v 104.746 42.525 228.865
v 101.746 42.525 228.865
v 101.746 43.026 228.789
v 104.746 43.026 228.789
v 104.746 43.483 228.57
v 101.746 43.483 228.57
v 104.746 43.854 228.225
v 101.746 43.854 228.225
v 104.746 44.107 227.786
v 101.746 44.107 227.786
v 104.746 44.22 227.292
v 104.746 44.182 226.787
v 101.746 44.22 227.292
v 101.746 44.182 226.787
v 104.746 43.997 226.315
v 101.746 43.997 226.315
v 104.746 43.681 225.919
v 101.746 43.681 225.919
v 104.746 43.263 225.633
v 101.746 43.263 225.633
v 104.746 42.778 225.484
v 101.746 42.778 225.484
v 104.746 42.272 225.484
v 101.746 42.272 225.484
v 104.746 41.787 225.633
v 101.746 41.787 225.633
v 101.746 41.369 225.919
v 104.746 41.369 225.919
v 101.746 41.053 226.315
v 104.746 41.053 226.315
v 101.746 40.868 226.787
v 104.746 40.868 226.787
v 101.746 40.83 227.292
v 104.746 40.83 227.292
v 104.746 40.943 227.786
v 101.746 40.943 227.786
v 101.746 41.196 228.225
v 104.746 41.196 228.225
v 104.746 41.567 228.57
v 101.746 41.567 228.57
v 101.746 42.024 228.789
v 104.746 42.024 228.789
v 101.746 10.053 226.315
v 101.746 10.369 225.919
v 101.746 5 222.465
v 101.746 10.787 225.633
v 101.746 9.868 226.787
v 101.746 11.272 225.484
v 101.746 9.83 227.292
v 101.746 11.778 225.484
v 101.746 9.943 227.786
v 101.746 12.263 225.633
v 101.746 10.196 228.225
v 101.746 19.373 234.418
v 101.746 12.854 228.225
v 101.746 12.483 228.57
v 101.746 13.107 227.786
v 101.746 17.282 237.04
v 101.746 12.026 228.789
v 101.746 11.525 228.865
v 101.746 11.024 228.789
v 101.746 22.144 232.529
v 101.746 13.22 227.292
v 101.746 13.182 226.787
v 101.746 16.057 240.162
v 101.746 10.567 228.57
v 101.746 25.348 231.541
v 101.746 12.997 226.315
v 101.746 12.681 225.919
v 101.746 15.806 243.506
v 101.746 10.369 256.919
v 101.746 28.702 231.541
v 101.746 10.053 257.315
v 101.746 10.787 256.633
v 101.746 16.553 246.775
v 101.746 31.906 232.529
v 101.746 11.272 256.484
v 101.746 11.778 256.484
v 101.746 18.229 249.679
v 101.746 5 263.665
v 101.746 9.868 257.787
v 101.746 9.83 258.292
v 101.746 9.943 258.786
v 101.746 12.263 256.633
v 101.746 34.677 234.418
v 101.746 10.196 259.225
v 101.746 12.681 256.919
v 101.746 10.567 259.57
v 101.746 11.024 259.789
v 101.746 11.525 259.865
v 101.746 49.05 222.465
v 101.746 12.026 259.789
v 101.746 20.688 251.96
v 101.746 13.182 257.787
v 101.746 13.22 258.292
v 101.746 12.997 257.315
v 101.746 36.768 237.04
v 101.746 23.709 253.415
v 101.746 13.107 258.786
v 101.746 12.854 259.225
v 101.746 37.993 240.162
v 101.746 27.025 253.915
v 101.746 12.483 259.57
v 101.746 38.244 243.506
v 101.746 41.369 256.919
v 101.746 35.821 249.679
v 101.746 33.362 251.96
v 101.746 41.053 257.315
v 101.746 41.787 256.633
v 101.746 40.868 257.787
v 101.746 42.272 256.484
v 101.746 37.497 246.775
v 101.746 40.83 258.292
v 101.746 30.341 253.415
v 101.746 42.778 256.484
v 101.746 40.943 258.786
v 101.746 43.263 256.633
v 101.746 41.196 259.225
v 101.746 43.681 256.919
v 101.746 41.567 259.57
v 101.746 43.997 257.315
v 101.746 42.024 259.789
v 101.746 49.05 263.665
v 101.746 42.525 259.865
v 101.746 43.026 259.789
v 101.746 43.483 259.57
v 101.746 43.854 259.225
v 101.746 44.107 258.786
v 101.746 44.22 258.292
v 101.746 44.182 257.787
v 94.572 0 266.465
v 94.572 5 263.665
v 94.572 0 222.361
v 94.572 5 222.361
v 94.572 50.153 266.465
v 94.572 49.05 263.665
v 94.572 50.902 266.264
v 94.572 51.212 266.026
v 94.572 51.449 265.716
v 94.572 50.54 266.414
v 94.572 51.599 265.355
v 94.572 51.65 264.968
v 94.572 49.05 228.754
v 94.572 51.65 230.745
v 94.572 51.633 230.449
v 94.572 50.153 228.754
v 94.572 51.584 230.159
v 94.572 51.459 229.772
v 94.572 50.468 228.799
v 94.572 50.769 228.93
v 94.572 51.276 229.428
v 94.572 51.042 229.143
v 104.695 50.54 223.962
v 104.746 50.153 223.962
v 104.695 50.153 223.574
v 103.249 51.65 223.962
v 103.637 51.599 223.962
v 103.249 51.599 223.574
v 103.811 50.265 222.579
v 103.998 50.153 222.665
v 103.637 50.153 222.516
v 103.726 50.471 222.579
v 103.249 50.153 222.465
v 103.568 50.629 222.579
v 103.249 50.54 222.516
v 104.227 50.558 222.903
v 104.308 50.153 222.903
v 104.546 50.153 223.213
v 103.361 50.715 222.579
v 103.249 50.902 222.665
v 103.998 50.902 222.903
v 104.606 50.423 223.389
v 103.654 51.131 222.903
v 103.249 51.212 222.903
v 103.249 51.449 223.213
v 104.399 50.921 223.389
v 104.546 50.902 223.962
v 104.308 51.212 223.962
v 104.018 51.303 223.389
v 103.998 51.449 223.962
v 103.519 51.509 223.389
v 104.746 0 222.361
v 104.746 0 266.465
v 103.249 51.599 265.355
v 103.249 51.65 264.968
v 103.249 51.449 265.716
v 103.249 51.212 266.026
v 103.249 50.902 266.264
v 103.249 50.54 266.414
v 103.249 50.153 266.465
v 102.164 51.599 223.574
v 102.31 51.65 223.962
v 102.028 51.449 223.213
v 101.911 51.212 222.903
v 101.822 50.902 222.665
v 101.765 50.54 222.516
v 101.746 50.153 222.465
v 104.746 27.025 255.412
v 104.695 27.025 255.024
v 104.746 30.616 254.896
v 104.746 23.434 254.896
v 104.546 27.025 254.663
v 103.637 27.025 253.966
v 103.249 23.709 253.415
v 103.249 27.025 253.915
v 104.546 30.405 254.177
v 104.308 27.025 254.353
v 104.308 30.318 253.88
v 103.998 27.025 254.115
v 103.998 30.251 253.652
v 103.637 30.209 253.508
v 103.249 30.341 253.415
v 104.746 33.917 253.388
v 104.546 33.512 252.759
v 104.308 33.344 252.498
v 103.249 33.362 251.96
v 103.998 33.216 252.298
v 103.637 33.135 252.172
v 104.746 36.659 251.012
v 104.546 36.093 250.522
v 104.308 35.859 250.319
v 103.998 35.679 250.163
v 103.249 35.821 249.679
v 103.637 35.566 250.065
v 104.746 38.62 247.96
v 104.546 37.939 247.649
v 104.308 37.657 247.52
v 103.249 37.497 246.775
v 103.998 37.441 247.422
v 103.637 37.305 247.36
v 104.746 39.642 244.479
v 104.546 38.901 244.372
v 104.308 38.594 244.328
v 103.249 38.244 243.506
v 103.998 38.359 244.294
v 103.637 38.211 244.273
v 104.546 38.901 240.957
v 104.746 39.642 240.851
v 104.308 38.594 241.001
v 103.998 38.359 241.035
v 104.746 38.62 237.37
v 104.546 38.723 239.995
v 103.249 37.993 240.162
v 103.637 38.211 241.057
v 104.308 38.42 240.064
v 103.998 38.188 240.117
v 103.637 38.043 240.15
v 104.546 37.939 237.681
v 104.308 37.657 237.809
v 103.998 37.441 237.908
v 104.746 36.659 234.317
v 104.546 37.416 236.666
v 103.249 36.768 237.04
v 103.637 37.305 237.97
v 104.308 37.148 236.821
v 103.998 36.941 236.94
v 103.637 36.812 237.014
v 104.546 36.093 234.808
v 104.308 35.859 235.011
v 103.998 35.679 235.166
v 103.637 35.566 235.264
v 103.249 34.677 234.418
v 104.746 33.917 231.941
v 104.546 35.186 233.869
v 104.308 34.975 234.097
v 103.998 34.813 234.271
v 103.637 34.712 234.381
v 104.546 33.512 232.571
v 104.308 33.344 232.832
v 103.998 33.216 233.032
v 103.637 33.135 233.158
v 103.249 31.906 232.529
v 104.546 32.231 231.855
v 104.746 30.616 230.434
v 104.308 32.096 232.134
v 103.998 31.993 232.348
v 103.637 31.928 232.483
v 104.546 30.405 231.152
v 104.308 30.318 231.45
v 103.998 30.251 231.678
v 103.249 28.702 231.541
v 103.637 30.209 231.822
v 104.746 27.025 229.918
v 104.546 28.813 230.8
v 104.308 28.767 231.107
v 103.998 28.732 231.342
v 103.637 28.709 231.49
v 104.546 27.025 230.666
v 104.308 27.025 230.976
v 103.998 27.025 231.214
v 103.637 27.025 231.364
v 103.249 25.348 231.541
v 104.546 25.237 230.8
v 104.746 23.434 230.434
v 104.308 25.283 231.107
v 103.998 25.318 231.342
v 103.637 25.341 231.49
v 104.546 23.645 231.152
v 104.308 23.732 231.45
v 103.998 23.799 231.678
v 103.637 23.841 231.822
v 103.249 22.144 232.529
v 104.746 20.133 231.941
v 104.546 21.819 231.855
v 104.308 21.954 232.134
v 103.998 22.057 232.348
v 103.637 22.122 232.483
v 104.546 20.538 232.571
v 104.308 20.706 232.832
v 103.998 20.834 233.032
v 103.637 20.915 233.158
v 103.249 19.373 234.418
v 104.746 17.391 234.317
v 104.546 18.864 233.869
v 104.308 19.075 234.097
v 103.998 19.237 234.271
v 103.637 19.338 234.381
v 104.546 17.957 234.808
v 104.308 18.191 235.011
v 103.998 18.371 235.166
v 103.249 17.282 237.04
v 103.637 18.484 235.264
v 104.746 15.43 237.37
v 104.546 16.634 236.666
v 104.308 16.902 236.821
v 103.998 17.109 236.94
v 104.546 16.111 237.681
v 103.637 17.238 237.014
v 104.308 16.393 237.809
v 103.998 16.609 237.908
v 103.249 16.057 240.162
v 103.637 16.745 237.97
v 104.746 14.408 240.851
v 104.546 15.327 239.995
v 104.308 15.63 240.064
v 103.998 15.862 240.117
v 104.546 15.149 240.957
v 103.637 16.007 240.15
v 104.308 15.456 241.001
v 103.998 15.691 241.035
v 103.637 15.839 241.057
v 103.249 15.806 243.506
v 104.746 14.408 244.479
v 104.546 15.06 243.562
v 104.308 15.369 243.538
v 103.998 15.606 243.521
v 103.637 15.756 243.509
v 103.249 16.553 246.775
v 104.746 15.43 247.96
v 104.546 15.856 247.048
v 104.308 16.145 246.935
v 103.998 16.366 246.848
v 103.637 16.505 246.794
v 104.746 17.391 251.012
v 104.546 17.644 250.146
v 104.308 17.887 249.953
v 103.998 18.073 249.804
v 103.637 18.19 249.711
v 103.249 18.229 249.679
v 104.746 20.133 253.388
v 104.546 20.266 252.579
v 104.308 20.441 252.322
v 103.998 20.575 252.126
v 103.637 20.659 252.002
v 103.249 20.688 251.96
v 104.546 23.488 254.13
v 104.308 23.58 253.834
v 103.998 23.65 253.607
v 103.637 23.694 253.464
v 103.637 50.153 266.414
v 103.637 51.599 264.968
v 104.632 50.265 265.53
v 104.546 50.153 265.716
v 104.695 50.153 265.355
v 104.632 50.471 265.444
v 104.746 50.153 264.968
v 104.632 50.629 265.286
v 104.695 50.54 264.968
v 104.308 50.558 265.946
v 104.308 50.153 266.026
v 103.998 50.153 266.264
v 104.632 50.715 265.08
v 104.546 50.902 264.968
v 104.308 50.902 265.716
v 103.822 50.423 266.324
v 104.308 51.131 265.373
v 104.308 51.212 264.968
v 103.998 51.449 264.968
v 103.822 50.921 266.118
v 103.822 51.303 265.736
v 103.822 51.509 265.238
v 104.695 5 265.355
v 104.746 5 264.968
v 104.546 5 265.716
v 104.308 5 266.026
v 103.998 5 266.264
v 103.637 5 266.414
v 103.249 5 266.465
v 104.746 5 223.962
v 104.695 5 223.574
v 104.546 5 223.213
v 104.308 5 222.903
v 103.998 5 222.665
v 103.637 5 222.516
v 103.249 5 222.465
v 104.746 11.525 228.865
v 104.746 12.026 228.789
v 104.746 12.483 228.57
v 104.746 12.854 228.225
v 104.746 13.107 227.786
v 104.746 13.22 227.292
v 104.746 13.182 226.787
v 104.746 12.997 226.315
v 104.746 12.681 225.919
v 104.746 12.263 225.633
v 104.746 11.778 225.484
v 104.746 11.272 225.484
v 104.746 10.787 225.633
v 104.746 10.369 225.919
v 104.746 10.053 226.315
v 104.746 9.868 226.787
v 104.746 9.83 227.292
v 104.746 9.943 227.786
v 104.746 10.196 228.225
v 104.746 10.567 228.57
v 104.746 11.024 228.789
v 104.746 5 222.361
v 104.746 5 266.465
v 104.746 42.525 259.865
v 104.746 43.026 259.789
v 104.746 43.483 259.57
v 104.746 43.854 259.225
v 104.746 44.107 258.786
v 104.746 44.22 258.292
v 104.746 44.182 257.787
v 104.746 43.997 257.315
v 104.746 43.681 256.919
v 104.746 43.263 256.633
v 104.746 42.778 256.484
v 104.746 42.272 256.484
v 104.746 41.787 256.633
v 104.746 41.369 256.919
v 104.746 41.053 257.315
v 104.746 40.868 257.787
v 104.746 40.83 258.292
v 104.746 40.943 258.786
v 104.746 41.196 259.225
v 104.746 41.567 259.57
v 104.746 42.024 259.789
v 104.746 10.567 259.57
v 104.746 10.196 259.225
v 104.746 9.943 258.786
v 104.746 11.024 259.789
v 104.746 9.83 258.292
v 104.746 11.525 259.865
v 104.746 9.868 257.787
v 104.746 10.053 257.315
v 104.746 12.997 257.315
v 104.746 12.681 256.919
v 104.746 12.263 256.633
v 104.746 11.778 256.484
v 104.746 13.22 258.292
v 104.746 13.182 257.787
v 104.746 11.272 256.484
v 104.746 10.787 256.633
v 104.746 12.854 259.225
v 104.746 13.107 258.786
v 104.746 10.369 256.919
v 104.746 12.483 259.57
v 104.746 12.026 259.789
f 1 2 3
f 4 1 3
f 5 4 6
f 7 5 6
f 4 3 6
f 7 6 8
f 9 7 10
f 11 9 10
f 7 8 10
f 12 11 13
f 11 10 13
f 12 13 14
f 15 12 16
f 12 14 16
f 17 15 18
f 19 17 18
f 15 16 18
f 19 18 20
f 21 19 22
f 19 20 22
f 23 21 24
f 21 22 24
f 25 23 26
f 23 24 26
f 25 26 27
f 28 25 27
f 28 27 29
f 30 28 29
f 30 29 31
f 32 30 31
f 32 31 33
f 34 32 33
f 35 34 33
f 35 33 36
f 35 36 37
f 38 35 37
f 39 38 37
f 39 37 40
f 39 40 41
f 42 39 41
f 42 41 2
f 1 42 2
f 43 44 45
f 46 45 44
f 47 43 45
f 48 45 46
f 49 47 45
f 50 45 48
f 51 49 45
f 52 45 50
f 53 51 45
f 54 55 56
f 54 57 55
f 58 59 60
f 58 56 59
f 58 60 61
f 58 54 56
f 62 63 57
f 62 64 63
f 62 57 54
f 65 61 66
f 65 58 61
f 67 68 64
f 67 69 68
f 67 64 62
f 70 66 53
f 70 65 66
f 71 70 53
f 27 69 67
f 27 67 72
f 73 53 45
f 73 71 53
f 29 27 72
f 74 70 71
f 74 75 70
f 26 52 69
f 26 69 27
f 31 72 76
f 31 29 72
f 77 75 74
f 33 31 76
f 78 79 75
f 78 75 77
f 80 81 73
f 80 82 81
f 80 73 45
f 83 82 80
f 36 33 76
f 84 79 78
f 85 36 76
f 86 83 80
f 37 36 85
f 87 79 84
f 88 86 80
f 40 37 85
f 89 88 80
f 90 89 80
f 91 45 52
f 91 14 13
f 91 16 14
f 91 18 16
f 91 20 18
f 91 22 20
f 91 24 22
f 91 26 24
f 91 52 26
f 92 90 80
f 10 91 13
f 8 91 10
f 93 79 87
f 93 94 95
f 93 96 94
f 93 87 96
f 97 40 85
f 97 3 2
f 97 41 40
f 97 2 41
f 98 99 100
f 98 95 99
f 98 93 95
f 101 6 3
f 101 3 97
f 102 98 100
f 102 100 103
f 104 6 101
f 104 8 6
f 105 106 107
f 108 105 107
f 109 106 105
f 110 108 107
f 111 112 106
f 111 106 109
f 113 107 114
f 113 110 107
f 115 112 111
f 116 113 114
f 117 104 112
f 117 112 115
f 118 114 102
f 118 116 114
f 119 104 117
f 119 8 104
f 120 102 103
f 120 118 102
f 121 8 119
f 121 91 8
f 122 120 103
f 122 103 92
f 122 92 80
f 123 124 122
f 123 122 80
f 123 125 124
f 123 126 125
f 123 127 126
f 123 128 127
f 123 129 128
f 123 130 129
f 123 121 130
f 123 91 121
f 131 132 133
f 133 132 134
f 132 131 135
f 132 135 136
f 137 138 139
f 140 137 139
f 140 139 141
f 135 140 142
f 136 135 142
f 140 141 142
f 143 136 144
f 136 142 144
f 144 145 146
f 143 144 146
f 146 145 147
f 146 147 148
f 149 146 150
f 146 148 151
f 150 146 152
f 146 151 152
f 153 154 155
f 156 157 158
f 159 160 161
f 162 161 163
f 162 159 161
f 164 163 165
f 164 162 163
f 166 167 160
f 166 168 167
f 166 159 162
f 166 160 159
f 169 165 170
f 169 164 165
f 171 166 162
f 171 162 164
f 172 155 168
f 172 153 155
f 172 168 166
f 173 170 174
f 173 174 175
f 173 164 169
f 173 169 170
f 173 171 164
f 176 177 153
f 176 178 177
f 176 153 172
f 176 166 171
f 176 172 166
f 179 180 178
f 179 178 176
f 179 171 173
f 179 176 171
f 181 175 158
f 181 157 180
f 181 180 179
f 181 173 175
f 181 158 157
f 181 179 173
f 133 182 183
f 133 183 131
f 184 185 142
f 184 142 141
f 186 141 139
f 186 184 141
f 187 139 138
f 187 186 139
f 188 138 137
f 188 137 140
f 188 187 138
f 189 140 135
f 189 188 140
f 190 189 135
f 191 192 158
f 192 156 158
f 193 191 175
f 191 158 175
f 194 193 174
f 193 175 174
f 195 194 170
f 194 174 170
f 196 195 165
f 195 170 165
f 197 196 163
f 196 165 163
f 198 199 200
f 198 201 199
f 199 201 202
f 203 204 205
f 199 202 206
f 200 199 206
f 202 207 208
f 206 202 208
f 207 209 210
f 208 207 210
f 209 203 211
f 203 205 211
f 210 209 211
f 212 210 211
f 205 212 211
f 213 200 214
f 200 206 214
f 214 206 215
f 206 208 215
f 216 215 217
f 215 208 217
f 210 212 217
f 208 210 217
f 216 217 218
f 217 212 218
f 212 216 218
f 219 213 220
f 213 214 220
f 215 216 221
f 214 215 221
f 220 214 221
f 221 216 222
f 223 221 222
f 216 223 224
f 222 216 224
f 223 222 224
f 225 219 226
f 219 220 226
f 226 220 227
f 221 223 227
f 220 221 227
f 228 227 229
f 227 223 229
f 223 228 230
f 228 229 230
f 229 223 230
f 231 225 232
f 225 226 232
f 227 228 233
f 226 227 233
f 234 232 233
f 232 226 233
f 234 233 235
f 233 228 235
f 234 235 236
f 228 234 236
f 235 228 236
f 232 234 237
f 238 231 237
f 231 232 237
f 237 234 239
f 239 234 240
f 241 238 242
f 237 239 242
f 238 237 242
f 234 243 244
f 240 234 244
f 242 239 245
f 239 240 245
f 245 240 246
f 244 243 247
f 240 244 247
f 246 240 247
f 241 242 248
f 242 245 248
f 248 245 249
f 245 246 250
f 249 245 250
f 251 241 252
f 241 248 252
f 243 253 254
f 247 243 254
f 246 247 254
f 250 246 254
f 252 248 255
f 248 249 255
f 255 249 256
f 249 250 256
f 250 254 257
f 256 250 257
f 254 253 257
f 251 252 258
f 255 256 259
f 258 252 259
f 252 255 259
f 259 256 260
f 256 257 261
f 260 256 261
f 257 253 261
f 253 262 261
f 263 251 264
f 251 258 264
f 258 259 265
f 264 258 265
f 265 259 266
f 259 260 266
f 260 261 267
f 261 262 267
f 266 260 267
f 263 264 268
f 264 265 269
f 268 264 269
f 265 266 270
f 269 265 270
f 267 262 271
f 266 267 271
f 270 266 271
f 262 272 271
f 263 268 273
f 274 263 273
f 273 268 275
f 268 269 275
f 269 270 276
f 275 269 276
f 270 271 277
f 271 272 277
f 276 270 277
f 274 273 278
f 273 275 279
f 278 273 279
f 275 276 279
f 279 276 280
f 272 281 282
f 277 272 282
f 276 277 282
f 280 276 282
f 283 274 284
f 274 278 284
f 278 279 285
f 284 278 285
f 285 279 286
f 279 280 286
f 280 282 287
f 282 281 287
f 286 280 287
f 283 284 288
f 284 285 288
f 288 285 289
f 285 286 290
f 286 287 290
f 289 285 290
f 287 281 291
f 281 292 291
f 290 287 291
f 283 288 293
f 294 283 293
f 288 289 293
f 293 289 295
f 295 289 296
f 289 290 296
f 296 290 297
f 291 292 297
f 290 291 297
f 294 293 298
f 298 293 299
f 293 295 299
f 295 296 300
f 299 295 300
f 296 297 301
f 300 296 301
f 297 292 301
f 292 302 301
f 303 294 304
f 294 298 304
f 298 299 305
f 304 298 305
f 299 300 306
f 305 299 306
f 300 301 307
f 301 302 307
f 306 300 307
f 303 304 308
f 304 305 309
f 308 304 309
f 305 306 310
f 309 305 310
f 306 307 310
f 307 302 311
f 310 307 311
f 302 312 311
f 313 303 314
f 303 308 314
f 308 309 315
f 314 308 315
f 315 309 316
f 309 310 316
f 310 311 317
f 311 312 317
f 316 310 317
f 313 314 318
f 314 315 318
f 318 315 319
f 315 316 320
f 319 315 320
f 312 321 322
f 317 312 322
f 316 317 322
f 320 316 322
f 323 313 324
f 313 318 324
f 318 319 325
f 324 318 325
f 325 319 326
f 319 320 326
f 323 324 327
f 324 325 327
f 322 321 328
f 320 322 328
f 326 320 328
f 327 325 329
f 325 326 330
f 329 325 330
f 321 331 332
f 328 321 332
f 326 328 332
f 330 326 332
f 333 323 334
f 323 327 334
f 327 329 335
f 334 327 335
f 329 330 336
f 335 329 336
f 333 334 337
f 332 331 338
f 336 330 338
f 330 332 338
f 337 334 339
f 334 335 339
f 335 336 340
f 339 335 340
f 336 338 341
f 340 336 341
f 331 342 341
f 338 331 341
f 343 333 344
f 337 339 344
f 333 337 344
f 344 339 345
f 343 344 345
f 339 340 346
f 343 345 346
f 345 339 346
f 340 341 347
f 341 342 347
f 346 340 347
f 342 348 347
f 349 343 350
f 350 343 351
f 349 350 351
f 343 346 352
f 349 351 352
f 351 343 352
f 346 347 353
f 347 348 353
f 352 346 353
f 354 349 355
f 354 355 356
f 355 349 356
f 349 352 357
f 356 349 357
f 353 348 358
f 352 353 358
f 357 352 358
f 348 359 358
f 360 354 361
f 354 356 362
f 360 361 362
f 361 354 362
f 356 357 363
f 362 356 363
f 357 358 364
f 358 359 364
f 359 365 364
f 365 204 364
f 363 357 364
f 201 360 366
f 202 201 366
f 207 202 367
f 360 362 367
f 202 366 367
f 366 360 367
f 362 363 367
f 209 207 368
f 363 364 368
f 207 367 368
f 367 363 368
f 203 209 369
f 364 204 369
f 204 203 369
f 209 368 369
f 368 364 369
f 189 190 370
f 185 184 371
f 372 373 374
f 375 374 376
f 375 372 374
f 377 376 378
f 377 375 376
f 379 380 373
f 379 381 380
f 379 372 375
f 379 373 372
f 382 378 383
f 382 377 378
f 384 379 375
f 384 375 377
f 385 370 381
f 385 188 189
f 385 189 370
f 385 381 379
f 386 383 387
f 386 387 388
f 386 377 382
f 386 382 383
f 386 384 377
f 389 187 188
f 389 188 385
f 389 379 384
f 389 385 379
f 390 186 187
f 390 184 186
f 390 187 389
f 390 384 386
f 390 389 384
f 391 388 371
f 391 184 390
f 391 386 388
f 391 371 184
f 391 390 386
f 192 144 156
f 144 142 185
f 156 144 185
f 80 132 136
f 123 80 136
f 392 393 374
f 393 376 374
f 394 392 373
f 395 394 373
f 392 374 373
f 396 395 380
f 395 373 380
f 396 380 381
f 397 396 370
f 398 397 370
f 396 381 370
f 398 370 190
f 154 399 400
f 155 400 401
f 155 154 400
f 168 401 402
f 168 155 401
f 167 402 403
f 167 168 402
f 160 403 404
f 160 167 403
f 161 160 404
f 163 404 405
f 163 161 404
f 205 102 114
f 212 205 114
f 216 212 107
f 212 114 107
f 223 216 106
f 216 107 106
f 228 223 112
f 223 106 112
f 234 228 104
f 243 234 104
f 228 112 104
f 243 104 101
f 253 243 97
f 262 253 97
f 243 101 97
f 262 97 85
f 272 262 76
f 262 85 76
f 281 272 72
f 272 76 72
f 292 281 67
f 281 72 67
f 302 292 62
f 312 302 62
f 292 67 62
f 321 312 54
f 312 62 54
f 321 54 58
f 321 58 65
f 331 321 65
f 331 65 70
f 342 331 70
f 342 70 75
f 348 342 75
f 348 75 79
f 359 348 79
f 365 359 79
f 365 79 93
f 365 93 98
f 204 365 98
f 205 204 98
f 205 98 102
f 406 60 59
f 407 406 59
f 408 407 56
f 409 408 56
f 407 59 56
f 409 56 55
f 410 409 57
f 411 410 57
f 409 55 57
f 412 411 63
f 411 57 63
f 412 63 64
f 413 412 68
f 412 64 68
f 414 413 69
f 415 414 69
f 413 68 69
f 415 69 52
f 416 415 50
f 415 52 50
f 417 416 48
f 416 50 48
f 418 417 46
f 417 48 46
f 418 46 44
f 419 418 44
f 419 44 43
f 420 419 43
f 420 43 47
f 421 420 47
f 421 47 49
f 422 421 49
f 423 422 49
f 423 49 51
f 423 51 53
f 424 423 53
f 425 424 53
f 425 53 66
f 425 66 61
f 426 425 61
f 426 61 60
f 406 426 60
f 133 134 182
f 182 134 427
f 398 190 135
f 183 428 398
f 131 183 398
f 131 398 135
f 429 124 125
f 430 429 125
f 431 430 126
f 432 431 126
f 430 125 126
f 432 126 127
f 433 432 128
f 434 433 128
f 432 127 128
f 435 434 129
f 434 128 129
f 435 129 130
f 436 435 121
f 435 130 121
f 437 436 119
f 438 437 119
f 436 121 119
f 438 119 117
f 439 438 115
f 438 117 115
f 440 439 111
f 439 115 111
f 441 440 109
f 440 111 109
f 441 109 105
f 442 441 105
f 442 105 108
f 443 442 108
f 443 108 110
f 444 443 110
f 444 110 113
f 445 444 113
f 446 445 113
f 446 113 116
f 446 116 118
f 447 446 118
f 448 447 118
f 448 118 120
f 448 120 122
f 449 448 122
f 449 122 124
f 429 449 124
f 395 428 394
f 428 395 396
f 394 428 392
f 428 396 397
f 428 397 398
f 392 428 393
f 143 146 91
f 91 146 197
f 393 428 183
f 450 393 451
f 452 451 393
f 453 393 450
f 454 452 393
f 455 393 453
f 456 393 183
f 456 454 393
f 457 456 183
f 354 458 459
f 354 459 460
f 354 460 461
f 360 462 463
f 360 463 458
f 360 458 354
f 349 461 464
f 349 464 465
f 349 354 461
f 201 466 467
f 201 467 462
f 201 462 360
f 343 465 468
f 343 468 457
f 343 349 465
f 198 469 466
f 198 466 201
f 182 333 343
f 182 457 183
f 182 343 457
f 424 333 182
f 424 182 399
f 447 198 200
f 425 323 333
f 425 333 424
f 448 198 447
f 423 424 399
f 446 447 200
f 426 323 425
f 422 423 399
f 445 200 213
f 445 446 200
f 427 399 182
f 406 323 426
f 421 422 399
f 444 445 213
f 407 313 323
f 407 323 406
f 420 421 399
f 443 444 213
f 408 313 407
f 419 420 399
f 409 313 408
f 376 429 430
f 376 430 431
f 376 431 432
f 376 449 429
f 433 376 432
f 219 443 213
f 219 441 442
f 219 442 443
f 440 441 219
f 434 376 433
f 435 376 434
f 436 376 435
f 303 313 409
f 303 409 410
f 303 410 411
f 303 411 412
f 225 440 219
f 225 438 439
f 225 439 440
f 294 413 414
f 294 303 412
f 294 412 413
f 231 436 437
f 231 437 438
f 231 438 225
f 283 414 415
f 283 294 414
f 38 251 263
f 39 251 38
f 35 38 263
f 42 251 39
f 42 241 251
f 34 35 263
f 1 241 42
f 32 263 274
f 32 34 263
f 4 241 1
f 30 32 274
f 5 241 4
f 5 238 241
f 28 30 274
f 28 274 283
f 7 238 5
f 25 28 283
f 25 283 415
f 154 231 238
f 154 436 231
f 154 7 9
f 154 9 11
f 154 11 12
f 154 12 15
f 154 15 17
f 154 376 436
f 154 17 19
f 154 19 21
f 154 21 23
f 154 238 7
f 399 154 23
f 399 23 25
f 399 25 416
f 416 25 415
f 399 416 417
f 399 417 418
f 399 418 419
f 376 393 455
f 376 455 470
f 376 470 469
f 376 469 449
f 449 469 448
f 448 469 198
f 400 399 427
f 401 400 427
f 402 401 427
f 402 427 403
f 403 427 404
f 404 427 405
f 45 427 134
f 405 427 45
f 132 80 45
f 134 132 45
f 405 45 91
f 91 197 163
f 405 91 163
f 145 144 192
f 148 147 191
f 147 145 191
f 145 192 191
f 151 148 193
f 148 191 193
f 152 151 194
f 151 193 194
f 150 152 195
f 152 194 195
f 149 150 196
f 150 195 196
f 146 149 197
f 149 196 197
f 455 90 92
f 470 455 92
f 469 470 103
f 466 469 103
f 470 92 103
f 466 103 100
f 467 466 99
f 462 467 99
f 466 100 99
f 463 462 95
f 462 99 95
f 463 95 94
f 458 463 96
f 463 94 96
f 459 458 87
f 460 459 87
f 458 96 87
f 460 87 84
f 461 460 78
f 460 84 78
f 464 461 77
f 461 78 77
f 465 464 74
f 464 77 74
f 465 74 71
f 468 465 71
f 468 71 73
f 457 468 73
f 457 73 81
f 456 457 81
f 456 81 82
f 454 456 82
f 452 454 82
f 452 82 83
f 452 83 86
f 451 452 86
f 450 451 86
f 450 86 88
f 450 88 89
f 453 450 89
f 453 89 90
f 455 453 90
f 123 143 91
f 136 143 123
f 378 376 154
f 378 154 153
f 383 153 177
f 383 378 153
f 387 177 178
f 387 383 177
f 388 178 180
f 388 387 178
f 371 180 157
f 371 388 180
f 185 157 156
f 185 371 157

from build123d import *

# Parameters (mm, degrees)
SKETCH_1_W            = 5
SKETCH_1_H            = 60
SKETCH_1_W_2          = 30
SKETCH_1_H_2          = 5
SKETCH_1_W_3          = 15
EXTRUDE_1_DEPTH       = 5
FILLET_1_R            = 5
SKETCH_2_W            = 245
SKETCH_2_H            = 125
CUT_EXTRUDE_1_DEPTH   = 5
SKETCH_3_W            = 110
SKETCH_3_H            = 2.5
SKETCH_3_W_2          = 115
CUT_EXTRUDE_2_DEPTH   = 10
SKETCH_4_W            = 5
SKETCH_4_H            = 5
CUT_EXTRUDE_3_DEPTH   = 5
SKETCH_5_W            = 50
SKETCH_5_H            = 46.65
EXTRUDE_2_DEPTH       = 47
SKETCH_6_W            = 41.4
SKETCH_6_H            = 44.05
CUT_EXTRUDE_4_DEPTH   = 47
SKETCH_7_R            = 11.25
CUT_EXTRUDE_5_DEPTH   = 317.004529962
CUT_EXTRUDE_6_DEPTH   = 46.65
SKETCH_10_R           = 1.7
CUT_EXTRUDE_7_DEPTH   = 317.004529962
SKETCH_13_R           = 25
CUT_EXTRUDE_9_DEPTH   = 20
FILLET_11_R           = 1.497
SKETCH_17_OUTSIDE_W   = 295.14
SKETCH_17_OUTSIDE_H   = 275.14
SKETCH_17_OUTSIDE_W_2 = 10.174383679
SKETCH_17_OUTSIDE_H_2 = 44.104202059
CUT_EXTRUDE_11_DEPTH  = 359.196699


with BuildPart() as part:
    # 草圖1 → 填料-伸長1 (new body)
    with BuildSketch(Plane(origin=(0, 0, 0), x_dir=(1, 0, 0), z_dir=(0, 1, 0))):
        Polygon((198.746286718, -286.464902661), (198.746286718, -256.464902661), (183.246286718, -256.464902661), (183.246286718, -266.464902661), (124.746286718, -266.464902661), (124.746286718, -262.464902661), (109.246286718, -262.464902661), (109.246286718, -266.464902661), (-21.253713282, -266.464902661), (-21.253713282, 38.535097339), (-36.253713282, 38.535097339), (-36.253713282, 43.535097339), (203.746286718, 43.535097339), (203.746286718, -286.464902661), align=None)
        with Locations((206.246286718, -256.464902661)):
            Rectangle(SKETCH_1_W, SKETCH_1_H)
        with Locations((206.246286718, 13.535097339)):
            Rectangle(SKETCH_1_W, SKETCH_1_H)
        with Locations((188.746286718, 46.035097339)):
            Rectangle(SKETCH_1_W_2, SKETCH_1_H_2)
        with Locations((-21.253713282, 46.035097339)):
            Rectangle(SKETCH_1_W_2, SKETCH_1_H_2)
        with Locations((91.246286718, 46.035097339)):
            Rectangle(SKETCH_1_W_3, SKETCH_1_H_2)
        with Locations((76.246286718, 46.035097339)):
            Rectangle(SKETCH_1_W_3, SKETCH_1_H_2)
        with Locations((206.246286718, -166.464902661)):
            Rectangle(SKETCH_1_W, SKETCH_1_H)
        with Locations((206.246286718, -76.464902661)):
            Rectangle(SKETCH_1_W, SKETCH_1_H)
    extrude(amount=EXTRUDE_1_DEPTH)

    # 圓角1
    fillet_1_edges = [part.edges().sort_by_distance(p)[0] for p in [
        (208.746286718, 5, -13.535097339),
        (208.746286718, 5, 76.464902661),
        (208.746286718, 5, 166.464902661),
        (208.746286718, 5, 256.464902661),
    ]]
    fillet(fillet_1_edges, radius=FILLET_1_R - 0.0001)  # a hair under: the kernel refuses the full size

    # 草圖2 → 除料-伸長1 (cut)
    with BuildSketch(Plane(origin=(0, 5, 0), x_dir=(1, 0, 0), z_dir=(0, 1, 0))):
        with Locations((86.246286718, -13.964902661)):
            Rectangle(SKETCH_2_W, SKETCH_2_H)
    extrude(amount=-CUT_EXTRUDE_1_DEPTH, mode=Mode.SUBTRACT)

    # 草圖3 → 除料-伸長2 (cut)
    with BuildSketch(Plane(origin=(0, 0, 76.464902661), x_dir=(-1, 0, 0), z_dir=(0, 0, -1))):
        with Locations((-33.746286718, 1.25)):
            Rectangle(SKETCH_3_W, SKETCH_3_H)
        with Locations((-151.246286718, 3.75)):
            Rectangle(SKETCH_3_W_2, SKETCH_3_H)
    extrude(amount=-CUT_EXTRUDE_2_DEPTH, mode=Mode.SUBTRACT)

    # 草圖4 → 除料-伸長3 (cut)
    with BuildSketch(Plane(origin=(0, 0, 76.464902661), x_dir=(-1, 0, 0), z_dir=(0, 0, -1))):
        with Locations((-91.246286718, 2.5)):
            Rectangle(SKETCH_4_W, SKETCH_4_H)
    extrude(amount=-CUT_EXTRUDE_3_DEPTH, mode=Mode.SUBTRACT)

    # 草圖5 → 填料-伸長2 (add)
    with BuildSketch(Plane.XY.offset(266.464902661)):
        with Locations((79.746286718, 28.325)):
            Rectangle(SKETCH_5_W, SKETCH_5_H)
    extrude(amount=-EXTRUDE_2_DEPTH)

    # 草圖6 → 除料-伸長4 (cut)
    with BuildSketch(Plane.ZY.offset(-54.746286718)):
        with Locations((242.964902661, 27.025)):
            Rectangle(SKETCH_6_W, SKETCH_6_H)
    extrude(amount=-CUT_EXTRUDE_4_DEPTH, mode=Mode.SUBTRACT)

    # 草圖7 → 除料-伸長5 (cut, through all)
    with BuildSketch(Plane.ZY.offset(-101.746286718)):
        with Locations((242.664902661, 27.025)):
            Circle(SKETCH_7_R)
    extrude(amount=-CUT_EXTRUDE_5_DEPTH, mode=Mode.SUBTRACT)

    # 草圖8 → 除料-伸長6 (cut)
    with BuildSketch(Plane(origin=(0, 51.65, 0), x_dir=(1, 0, 0), z_dir=(0, 1, 0))):
        Polygon((54.746286718, -263.664902661), (101.746286718, -222.464902661), (104.746286718, -222.464902661), (104.746286718, -219.464902661), (54.746286718, -219.464902661), align=None)
    extrude(amount=-CUT_EXTRUDE_6_DEPTH, mode=Mode.SUBTRACT)

    # 草圖10 → 除料-伸長7 (cut, through all)
    with BuildSketch(Plane.ZY.offset(-101.746286718)):
        with Locations((227.164902661, 42.525)):
            Circle(SKETCH_10_R)
        with Locations((258.164902661, 42.525)):
            Circle(SKETCH_10_R)
        with Locations((258.164902661, 11.525)):
            Circle(SKETCH_10_R)
        with Locations((227.164902661, 11.525)):
            Circle(SKETCH_10_R)
    extrude(amount=-CUT_EXTRUDE_7_DEPTH, mode=Mode.SUBTRACT)

    # 草圖13 → 除料-伸長9 (cut)
    with BuildSketch(Plane(origin=(104.746286718, 0, 0), x_dir=(0, 0, -1), z_dir=(1, 0, 0))):
        with Locations((-242.664902661, 27.025)):
            Circle(SKETCH_13_R)
    extrude(amount=CUT_EXTRUDE_9_DEPTH, mode=Mode.SUBTRACT)

    # 圓角11
    fillet_11_edges = [part.edges().sort_by_distance(p)[0] for p in [
        (54.746286718, 28.325, 266.464902661),
        (79.746286718, 51.65, 266.464902661),
        (104.746286718, 28.325, 266.464902661),
        (104.746286718, 27.025, 231.414902661),
        (54.746286718, 51.65, 265.064902661),
        (104.746286718, 51.65, 244.464902661),
        (104.746286718, 28.325, 222.464902661),
        (78.246286718, 51.65, 243.064902661),
        (103.246286718, 51.65, 222.464902661),
    ]]
    fillet(fillet_11_edges, radius=FILLET_11_R)

    # 草圖17 outside → 除料-伸長11 (cut, through all)
    with BuildSketch(Plane(origin=(0, 51.65, 0), x_dir=(1, 0, 0), z_dir=(0, 1, 0))):
        with Locations((93.746, -181.465)):
            Rectangle(SKETCH_17_OUTSIDE_W, SKETCH_17_OUTSIDE_H)
        with Locations((99.659094879, -244.412801632)):
            Rectangle(SKETCH_17_OUTSIDE_W_2, SKETCH_17_OUTSIDE_H_2, mode=Mode.SUBTRACT)
    extrude(amount=-CUT_EXTRUDE_11_DEPTH, mode=Mode.SUBTRACT)


solid = part.part
